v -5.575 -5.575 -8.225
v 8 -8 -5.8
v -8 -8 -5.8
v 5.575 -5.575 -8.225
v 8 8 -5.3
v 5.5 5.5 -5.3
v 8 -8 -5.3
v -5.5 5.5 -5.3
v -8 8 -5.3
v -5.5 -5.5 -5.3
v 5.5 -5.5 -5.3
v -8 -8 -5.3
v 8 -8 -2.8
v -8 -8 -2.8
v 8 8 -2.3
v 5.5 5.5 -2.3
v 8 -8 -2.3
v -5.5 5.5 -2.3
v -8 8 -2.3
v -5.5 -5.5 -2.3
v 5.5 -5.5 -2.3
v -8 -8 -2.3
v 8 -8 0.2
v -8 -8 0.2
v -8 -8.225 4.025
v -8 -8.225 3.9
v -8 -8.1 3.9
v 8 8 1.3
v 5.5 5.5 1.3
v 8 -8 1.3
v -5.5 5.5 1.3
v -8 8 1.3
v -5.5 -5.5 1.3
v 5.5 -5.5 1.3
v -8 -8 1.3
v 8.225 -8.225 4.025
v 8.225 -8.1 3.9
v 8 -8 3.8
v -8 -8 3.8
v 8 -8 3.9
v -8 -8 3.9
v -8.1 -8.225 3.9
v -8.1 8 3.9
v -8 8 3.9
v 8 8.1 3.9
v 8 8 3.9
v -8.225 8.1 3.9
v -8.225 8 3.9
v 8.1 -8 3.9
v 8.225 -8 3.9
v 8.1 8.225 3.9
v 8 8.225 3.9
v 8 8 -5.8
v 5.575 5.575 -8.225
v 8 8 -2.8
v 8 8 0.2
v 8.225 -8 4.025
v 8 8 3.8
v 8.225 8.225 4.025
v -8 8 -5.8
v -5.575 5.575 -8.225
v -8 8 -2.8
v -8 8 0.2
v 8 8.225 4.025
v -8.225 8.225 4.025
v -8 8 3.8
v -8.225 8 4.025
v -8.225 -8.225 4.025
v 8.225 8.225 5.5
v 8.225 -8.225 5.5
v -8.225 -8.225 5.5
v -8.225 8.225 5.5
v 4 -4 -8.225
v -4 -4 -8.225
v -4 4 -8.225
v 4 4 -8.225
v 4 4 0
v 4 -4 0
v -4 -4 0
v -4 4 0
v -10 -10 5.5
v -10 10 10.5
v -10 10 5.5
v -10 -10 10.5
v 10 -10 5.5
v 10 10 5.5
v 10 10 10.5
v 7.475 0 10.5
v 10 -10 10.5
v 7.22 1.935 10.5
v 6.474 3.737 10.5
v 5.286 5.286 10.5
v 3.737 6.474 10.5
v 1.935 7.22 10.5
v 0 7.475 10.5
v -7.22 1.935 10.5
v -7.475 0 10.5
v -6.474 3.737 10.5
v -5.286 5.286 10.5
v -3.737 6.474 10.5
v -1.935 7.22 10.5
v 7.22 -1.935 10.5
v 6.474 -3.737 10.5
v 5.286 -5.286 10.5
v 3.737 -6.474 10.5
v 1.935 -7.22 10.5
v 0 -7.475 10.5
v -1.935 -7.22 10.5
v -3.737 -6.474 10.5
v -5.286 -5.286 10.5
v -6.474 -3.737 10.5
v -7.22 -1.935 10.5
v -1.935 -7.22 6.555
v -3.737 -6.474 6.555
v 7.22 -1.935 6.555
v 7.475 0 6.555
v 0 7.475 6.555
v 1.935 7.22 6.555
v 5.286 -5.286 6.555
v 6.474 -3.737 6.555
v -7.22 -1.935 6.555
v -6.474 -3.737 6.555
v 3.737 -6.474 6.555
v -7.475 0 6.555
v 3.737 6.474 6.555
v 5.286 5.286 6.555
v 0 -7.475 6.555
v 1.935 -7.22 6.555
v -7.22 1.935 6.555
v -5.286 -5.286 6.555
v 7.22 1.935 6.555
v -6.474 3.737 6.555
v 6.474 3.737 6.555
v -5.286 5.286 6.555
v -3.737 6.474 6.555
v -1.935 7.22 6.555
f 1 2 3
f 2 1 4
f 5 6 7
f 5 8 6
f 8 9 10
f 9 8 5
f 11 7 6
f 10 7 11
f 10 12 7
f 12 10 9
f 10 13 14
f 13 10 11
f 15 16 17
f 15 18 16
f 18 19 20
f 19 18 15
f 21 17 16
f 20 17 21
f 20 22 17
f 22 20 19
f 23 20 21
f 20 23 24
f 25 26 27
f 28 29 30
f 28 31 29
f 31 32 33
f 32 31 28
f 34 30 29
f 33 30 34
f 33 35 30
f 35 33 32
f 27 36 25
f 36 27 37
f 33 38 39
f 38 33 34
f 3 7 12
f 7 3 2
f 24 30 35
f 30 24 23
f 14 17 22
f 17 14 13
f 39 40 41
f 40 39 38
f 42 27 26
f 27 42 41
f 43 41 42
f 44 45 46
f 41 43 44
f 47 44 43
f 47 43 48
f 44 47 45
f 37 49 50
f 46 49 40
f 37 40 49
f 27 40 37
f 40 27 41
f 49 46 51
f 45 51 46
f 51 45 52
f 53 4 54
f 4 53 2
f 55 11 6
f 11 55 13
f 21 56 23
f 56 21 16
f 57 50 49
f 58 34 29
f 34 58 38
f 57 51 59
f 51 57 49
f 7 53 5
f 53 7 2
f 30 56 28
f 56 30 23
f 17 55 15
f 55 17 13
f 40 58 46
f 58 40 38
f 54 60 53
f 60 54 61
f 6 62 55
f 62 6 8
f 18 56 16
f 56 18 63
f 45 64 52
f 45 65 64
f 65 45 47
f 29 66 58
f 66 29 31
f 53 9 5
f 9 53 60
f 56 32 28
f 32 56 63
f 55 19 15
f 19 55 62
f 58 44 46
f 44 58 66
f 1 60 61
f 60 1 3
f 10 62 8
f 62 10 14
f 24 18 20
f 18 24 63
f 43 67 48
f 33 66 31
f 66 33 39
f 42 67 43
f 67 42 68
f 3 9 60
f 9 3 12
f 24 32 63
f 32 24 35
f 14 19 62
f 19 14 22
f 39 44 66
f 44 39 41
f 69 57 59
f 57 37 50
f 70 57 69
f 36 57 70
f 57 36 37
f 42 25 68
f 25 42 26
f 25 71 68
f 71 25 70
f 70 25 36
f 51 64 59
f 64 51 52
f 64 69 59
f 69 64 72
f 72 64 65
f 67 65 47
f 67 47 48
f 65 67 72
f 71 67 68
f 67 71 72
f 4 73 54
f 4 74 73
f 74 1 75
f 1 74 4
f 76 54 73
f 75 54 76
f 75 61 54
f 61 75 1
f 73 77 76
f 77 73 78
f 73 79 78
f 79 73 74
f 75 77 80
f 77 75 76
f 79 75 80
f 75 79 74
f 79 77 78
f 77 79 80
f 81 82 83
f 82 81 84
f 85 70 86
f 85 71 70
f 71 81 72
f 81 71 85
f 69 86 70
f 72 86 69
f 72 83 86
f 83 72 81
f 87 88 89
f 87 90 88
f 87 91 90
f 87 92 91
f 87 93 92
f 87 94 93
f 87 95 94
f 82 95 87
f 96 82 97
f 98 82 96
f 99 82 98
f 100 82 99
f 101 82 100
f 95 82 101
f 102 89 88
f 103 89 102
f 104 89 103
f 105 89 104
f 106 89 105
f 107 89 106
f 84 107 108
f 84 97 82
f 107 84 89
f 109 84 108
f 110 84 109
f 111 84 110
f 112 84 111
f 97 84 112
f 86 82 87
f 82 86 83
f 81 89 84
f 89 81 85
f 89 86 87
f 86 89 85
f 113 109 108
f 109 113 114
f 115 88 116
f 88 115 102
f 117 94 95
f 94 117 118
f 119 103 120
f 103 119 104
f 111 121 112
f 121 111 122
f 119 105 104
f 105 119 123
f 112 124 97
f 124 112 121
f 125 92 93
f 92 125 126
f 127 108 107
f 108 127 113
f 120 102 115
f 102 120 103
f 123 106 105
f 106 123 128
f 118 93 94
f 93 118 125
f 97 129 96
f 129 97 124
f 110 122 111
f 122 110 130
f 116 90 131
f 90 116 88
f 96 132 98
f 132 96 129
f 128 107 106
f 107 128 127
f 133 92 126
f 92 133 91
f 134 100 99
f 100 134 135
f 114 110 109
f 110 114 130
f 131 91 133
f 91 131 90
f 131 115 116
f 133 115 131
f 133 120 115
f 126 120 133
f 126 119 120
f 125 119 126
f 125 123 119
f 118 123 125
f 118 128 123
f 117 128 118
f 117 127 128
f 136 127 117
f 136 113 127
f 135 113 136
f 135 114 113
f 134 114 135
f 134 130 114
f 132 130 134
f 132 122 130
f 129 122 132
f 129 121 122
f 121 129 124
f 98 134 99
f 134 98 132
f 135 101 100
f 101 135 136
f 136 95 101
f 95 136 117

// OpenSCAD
use <MCAD/triangles.scad>

module bar() {
	difference() {
		cube([20,300,20],center=true);
		cube([16,310,16],center=true);	
	}
}

//bar();

module magnet() {
	cylinder(r=7.475, h=3.95, center=true);
}



module connector() {
	
	difference() {
		cube(16.45,center=true);
		scale([0.5,1.5,0.5])
		translate([0,-8,0])
		cube(16,center=true);
		notches();
	}

	translate([0,8,0])
	rotate([90,0,0])
	cube([20,20,5],center=true);

	
}

module notches() {
	for(i=[0:3]) {
		rotate([0,i*90,0]) {
			for(d=[-8.3,-5.3,-2.3,1.3]) {
				translate([-8,d,8.5])
				rotate([0,90,0])
				triangle(3,3,16.45);
			}
			
			translate([0,-2.1,8.5])
			cube([16.45,12,1],center=true);
		}
	}
}

rotate([90,0,0])
difference() {
connector();
translate([0,8.53,0])
rotate([90,0,0])
color("gold")
magnet();
}


//module maleConnector() {
//	connector();
//}
//
//module femaleConnector() {
//	connector();
//}

//translate([40,0,0])
//maleConnector();
//
//translate([-40,0,0])
//femaleConnector();

//module triangle(o_len, a_len, depth)
//{
//    linear_extrude(height=depth)
//    {
//        polygon(points=[[0,0],[a_len,0],[0,o_len]], paths=[[0,1,2]]);
//    }
//}
